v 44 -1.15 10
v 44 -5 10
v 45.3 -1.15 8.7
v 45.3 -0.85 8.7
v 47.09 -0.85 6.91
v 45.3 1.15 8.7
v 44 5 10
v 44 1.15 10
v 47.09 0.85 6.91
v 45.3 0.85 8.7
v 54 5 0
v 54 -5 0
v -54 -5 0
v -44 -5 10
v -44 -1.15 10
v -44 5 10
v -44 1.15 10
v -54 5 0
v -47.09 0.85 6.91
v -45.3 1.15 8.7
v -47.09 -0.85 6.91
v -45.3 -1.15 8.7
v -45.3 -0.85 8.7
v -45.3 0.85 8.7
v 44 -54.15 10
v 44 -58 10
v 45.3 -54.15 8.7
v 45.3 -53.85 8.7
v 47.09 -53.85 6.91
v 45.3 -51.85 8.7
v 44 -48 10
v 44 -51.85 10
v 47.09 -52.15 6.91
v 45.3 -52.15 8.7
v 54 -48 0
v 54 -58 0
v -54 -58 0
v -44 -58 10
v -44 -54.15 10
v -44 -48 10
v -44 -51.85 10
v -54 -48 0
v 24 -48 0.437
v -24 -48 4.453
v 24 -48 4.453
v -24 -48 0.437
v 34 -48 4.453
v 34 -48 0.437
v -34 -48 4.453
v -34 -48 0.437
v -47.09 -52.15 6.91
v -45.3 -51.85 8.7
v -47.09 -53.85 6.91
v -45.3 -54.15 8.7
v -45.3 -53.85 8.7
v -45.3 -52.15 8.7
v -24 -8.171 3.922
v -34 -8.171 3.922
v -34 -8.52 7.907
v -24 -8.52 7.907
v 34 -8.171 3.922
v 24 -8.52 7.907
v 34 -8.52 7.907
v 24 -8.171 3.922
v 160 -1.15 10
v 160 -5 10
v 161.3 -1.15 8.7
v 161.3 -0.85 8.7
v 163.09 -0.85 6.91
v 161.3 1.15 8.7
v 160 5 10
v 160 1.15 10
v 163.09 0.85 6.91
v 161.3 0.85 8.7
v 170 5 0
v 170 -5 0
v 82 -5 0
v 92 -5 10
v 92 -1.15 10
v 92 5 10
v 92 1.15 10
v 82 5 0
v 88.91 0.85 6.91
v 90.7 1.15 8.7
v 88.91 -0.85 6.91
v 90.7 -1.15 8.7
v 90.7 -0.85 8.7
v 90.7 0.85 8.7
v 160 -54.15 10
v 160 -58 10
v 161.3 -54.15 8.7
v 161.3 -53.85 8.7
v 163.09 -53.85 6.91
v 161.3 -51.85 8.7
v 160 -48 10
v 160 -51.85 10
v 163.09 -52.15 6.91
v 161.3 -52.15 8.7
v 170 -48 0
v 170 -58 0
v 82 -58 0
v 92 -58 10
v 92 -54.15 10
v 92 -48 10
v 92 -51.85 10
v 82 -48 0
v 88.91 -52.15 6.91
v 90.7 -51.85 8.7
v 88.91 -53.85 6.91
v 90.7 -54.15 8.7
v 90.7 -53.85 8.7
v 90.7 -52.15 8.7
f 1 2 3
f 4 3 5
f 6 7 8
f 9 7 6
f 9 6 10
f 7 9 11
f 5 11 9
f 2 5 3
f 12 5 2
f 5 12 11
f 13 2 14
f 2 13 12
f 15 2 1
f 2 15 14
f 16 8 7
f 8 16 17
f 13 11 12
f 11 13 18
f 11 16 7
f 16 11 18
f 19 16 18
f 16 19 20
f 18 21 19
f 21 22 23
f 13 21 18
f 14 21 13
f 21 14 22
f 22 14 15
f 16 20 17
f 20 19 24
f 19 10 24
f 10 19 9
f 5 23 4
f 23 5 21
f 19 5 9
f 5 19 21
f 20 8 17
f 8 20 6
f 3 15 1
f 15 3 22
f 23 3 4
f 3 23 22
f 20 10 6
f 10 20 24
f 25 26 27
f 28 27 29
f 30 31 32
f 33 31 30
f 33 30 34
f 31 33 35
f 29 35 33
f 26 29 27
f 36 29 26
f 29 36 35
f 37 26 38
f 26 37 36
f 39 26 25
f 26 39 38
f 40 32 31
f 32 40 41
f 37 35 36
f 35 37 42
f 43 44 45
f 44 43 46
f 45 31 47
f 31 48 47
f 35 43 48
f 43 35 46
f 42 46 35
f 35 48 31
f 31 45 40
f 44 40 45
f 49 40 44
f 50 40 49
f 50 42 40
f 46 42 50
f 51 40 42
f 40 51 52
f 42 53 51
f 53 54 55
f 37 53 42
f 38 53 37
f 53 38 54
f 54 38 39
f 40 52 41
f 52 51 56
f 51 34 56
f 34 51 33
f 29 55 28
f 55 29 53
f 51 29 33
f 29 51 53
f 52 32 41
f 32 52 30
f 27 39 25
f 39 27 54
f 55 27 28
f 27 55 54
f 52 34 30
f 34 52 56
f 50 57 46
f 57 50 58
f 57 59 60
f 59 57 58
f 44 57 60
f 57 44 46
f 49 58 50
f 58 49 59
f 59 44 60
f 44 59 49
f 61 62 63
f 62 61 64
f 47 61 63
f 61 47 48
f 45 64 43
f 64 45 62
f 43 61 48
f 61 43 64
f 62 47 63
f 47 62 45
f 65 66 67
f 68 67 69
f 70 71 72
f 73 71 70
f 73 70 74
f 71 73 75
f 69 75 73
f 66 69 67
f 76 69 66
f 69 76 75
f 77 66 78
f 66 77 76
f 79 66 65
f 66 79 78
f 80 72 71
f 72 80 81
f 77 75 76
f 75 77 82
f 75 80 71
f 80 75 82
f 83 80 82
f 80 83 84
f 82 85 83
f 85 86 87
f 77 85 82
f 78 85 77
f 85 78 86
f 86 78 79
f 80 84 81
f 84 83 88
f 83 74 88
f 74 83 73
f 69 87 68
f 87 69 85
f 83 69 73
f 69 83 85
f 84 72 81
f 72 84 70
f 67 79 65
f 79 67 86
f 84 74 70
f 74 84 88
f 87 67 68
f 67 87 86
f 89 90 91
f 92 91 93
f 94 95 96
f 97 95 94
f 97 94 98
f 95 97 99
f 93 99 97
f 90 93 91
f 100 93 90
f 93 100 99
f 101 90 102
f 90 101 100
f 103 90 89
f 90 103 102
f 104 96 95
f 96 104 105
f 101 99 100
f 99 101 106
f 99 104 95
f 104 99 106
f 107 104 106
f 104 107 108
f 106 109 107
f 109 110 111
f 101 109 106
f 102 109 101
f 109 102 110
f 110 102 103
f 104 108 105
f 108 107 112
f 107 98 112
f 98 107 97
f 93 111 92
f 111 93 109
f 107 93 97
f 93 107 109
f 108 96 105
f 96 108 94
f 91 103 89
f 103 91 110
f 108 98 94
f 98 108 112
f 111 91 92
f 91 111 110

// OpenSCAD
// ============================================================
// PCB Picture-Frame Rails — 4 PART EXPORT (TOP/BOTTOM/LEFT/RIGHT)
// - Miters oriented correctly: INNER edge is SHORT, OUTER edge is LONG (picture-frame style)
// - PCB channel captures thickness in Z, opens at INNER edge (Y=0)
// - Bottom rail has angled legs (attached OUTSIDE, never intrudes into channel)
// - PART selector exports ONE part at a time or a 4-object print plate
//
// PCB: 90 x 70 x 1.5 mm
// Units: mm
// ============================================================

// ---------------- EXPORT SELECTOR ----------------
PART = "PLATE";   // "TOP","BOTTOM","LEFT","RIGHT","PLATE"

// ---------------- PCB ----------------
pcb_x = 88;
pcb_y = 68;
pcb_t = 1.5;

// ---------------- Rail cross-section ----------------
// Local coords (before placement):
// X = length
// Y = border width (inner edge at Y=0, outer at Y=rail_w)
// Z = thickness (centered)
rail_w = 10.0;
rail_z = 10.0;

// ---------------- Channel ----------------
// Captures PCB thickness in Z, open at inner edge (Y=0), seats into +Y
slot_clear = 0.10;
slot_z     = pcb_t + 2*slot_clear;
slot_depth = 3.0;

// ---------------- Legs (bottom rail only) ----------------
legs_enable   = true;
leg_w         = 10.0;
leg_th        = 4.0;
leg_len       = 40.0;
leg_inset     = 15.0;
leg_angle_deg = 5;
leg_y_out     = 0.0;
leg_y_span    = 4.0;

// ---------------- Inner-edge lengths define opening ----------------
Lx_in = pcb_x;
Ly_in = pcb_y;

// ============================================================
// RAIL GEOMETRY — correct miter direction (inner short, outer long)
// ============================================================

module rail_outline_2d(L_in){
  // Inner edge (Y=0) length = L_in (SHORT)
  // Outer edge (Y=rail_w) length = L_in + 2*rail_w (LONG)
  polygon(points=[
    [-L_in/2,           0],
    [ L_in/2,           0],
    [ L_in/2 + rail_w,  rail_w],
    [-L_in/2 - rail_w,  rail_w]
  ]);
}

module rail_solid(L_in){
  linear_extrude(height=rail_z, center=true)
    rail_outline_2d(L_in);
}

module rail_with_channel(L_in){
  difference(){
    rail_solid(L_in);

    // Channel cut: make it long enough to cover the full outer length
    L_outer = L_in + 2*rail_w;

    // Main channel: open at Y=0, seats into +Y by slot_depth, height slot_z in Z.
    translate([0, slot_depth/2 - 0.01, 0])
      cube([L_outer + 4, slot_depth + 0.2, slot_z], center=true);

    // Flared mouth
    translate([0, 0.6, 0])
      cube([L_outer + 4, 1.4, slot_z + 0.6], center=true);
  }
}

// ============================================================
// Legs (bottom rail only) — attached OUTSIDE (Y > rail_w)
// ============================================================

module angled_leg_at(xpos){
  y0 = rail_w + leg_y_out;

  // Leg body (tilted backward)
  translate([xpos, y0, 0])
    rotate([leg_angle_deg,0,0])
      translate([0, -leg_y_span/2, rail_z/2 + leg_len/2])
        cube([leg_w, leg_y_span, leg_len], center=true);

}

module rail_part(L_in, is_bottom=false){
  rail_with_channel(L_in);

  if (is_bottom && legs_enable){
    // Legs positioned relative to INNER length; safe and consistent
    for (sx=[-1,1])
      angled_leg_at(sx*(L_in/2 - leg_inset));
  }
}

// ============================================================
// Individual rails (4 parts)
// ============================================================

module top_rail()    { rail_part(Lx_in, false); }
module bottom_rail() { rail_part(Lx_in, true ); }
module left_rail()   { rail_part(Ly_in, false); }
module right_rail()  { rail_part(Ly_in, false); }

// ============================================================
// Print orientation: channel faces UP (+Z)
// Rotate so +Y becomes +Z. Then lift by rail_w so it's on the bed.
// ============================================================

module top_print()    { translate([0,0,rail_w]) rotate([-90,0,0]) top_rail(); }
module bottom_print() { translate([0,0,rail_w]) rotate([-90,0,0]) bottom_rail(); }
module left_print()   { translate([0,0,rail_w]) rotate([-90,0,0]) left_rail(); }
module right_print()  { translate([0,0,rail_w]) rotate([-90,0,0]) right_rail(); }

// ============================================================
// Print plate (4 separate objects in one STL)
// ============================================================

module plate_print(){
  gap = 18;

  // Conservative spacing
  xshift = max(Lx_in + 2*rail_w, Ly_in + 2*rail_w) + gap;
  yshift = rail_z + gap + 25; // room for legs

  top_print();
  translate([0, -yshift, 0]) bottom_print();
  translate([xshift, 0, 0]) left_print();
  translate([xshift, -yshift, 0]) right_print();
}

// ============================================================
// OUTPUT SELECTOR
// ============================================================

if (PART == "TOP")         top_print();
else if (PART == "BOTTOM") bottom_print();
else if (PART == "LEFT")   left_print();
else if (PART == "RIGHT")  right_print();
else                       plate_print();  // "PLATE"
